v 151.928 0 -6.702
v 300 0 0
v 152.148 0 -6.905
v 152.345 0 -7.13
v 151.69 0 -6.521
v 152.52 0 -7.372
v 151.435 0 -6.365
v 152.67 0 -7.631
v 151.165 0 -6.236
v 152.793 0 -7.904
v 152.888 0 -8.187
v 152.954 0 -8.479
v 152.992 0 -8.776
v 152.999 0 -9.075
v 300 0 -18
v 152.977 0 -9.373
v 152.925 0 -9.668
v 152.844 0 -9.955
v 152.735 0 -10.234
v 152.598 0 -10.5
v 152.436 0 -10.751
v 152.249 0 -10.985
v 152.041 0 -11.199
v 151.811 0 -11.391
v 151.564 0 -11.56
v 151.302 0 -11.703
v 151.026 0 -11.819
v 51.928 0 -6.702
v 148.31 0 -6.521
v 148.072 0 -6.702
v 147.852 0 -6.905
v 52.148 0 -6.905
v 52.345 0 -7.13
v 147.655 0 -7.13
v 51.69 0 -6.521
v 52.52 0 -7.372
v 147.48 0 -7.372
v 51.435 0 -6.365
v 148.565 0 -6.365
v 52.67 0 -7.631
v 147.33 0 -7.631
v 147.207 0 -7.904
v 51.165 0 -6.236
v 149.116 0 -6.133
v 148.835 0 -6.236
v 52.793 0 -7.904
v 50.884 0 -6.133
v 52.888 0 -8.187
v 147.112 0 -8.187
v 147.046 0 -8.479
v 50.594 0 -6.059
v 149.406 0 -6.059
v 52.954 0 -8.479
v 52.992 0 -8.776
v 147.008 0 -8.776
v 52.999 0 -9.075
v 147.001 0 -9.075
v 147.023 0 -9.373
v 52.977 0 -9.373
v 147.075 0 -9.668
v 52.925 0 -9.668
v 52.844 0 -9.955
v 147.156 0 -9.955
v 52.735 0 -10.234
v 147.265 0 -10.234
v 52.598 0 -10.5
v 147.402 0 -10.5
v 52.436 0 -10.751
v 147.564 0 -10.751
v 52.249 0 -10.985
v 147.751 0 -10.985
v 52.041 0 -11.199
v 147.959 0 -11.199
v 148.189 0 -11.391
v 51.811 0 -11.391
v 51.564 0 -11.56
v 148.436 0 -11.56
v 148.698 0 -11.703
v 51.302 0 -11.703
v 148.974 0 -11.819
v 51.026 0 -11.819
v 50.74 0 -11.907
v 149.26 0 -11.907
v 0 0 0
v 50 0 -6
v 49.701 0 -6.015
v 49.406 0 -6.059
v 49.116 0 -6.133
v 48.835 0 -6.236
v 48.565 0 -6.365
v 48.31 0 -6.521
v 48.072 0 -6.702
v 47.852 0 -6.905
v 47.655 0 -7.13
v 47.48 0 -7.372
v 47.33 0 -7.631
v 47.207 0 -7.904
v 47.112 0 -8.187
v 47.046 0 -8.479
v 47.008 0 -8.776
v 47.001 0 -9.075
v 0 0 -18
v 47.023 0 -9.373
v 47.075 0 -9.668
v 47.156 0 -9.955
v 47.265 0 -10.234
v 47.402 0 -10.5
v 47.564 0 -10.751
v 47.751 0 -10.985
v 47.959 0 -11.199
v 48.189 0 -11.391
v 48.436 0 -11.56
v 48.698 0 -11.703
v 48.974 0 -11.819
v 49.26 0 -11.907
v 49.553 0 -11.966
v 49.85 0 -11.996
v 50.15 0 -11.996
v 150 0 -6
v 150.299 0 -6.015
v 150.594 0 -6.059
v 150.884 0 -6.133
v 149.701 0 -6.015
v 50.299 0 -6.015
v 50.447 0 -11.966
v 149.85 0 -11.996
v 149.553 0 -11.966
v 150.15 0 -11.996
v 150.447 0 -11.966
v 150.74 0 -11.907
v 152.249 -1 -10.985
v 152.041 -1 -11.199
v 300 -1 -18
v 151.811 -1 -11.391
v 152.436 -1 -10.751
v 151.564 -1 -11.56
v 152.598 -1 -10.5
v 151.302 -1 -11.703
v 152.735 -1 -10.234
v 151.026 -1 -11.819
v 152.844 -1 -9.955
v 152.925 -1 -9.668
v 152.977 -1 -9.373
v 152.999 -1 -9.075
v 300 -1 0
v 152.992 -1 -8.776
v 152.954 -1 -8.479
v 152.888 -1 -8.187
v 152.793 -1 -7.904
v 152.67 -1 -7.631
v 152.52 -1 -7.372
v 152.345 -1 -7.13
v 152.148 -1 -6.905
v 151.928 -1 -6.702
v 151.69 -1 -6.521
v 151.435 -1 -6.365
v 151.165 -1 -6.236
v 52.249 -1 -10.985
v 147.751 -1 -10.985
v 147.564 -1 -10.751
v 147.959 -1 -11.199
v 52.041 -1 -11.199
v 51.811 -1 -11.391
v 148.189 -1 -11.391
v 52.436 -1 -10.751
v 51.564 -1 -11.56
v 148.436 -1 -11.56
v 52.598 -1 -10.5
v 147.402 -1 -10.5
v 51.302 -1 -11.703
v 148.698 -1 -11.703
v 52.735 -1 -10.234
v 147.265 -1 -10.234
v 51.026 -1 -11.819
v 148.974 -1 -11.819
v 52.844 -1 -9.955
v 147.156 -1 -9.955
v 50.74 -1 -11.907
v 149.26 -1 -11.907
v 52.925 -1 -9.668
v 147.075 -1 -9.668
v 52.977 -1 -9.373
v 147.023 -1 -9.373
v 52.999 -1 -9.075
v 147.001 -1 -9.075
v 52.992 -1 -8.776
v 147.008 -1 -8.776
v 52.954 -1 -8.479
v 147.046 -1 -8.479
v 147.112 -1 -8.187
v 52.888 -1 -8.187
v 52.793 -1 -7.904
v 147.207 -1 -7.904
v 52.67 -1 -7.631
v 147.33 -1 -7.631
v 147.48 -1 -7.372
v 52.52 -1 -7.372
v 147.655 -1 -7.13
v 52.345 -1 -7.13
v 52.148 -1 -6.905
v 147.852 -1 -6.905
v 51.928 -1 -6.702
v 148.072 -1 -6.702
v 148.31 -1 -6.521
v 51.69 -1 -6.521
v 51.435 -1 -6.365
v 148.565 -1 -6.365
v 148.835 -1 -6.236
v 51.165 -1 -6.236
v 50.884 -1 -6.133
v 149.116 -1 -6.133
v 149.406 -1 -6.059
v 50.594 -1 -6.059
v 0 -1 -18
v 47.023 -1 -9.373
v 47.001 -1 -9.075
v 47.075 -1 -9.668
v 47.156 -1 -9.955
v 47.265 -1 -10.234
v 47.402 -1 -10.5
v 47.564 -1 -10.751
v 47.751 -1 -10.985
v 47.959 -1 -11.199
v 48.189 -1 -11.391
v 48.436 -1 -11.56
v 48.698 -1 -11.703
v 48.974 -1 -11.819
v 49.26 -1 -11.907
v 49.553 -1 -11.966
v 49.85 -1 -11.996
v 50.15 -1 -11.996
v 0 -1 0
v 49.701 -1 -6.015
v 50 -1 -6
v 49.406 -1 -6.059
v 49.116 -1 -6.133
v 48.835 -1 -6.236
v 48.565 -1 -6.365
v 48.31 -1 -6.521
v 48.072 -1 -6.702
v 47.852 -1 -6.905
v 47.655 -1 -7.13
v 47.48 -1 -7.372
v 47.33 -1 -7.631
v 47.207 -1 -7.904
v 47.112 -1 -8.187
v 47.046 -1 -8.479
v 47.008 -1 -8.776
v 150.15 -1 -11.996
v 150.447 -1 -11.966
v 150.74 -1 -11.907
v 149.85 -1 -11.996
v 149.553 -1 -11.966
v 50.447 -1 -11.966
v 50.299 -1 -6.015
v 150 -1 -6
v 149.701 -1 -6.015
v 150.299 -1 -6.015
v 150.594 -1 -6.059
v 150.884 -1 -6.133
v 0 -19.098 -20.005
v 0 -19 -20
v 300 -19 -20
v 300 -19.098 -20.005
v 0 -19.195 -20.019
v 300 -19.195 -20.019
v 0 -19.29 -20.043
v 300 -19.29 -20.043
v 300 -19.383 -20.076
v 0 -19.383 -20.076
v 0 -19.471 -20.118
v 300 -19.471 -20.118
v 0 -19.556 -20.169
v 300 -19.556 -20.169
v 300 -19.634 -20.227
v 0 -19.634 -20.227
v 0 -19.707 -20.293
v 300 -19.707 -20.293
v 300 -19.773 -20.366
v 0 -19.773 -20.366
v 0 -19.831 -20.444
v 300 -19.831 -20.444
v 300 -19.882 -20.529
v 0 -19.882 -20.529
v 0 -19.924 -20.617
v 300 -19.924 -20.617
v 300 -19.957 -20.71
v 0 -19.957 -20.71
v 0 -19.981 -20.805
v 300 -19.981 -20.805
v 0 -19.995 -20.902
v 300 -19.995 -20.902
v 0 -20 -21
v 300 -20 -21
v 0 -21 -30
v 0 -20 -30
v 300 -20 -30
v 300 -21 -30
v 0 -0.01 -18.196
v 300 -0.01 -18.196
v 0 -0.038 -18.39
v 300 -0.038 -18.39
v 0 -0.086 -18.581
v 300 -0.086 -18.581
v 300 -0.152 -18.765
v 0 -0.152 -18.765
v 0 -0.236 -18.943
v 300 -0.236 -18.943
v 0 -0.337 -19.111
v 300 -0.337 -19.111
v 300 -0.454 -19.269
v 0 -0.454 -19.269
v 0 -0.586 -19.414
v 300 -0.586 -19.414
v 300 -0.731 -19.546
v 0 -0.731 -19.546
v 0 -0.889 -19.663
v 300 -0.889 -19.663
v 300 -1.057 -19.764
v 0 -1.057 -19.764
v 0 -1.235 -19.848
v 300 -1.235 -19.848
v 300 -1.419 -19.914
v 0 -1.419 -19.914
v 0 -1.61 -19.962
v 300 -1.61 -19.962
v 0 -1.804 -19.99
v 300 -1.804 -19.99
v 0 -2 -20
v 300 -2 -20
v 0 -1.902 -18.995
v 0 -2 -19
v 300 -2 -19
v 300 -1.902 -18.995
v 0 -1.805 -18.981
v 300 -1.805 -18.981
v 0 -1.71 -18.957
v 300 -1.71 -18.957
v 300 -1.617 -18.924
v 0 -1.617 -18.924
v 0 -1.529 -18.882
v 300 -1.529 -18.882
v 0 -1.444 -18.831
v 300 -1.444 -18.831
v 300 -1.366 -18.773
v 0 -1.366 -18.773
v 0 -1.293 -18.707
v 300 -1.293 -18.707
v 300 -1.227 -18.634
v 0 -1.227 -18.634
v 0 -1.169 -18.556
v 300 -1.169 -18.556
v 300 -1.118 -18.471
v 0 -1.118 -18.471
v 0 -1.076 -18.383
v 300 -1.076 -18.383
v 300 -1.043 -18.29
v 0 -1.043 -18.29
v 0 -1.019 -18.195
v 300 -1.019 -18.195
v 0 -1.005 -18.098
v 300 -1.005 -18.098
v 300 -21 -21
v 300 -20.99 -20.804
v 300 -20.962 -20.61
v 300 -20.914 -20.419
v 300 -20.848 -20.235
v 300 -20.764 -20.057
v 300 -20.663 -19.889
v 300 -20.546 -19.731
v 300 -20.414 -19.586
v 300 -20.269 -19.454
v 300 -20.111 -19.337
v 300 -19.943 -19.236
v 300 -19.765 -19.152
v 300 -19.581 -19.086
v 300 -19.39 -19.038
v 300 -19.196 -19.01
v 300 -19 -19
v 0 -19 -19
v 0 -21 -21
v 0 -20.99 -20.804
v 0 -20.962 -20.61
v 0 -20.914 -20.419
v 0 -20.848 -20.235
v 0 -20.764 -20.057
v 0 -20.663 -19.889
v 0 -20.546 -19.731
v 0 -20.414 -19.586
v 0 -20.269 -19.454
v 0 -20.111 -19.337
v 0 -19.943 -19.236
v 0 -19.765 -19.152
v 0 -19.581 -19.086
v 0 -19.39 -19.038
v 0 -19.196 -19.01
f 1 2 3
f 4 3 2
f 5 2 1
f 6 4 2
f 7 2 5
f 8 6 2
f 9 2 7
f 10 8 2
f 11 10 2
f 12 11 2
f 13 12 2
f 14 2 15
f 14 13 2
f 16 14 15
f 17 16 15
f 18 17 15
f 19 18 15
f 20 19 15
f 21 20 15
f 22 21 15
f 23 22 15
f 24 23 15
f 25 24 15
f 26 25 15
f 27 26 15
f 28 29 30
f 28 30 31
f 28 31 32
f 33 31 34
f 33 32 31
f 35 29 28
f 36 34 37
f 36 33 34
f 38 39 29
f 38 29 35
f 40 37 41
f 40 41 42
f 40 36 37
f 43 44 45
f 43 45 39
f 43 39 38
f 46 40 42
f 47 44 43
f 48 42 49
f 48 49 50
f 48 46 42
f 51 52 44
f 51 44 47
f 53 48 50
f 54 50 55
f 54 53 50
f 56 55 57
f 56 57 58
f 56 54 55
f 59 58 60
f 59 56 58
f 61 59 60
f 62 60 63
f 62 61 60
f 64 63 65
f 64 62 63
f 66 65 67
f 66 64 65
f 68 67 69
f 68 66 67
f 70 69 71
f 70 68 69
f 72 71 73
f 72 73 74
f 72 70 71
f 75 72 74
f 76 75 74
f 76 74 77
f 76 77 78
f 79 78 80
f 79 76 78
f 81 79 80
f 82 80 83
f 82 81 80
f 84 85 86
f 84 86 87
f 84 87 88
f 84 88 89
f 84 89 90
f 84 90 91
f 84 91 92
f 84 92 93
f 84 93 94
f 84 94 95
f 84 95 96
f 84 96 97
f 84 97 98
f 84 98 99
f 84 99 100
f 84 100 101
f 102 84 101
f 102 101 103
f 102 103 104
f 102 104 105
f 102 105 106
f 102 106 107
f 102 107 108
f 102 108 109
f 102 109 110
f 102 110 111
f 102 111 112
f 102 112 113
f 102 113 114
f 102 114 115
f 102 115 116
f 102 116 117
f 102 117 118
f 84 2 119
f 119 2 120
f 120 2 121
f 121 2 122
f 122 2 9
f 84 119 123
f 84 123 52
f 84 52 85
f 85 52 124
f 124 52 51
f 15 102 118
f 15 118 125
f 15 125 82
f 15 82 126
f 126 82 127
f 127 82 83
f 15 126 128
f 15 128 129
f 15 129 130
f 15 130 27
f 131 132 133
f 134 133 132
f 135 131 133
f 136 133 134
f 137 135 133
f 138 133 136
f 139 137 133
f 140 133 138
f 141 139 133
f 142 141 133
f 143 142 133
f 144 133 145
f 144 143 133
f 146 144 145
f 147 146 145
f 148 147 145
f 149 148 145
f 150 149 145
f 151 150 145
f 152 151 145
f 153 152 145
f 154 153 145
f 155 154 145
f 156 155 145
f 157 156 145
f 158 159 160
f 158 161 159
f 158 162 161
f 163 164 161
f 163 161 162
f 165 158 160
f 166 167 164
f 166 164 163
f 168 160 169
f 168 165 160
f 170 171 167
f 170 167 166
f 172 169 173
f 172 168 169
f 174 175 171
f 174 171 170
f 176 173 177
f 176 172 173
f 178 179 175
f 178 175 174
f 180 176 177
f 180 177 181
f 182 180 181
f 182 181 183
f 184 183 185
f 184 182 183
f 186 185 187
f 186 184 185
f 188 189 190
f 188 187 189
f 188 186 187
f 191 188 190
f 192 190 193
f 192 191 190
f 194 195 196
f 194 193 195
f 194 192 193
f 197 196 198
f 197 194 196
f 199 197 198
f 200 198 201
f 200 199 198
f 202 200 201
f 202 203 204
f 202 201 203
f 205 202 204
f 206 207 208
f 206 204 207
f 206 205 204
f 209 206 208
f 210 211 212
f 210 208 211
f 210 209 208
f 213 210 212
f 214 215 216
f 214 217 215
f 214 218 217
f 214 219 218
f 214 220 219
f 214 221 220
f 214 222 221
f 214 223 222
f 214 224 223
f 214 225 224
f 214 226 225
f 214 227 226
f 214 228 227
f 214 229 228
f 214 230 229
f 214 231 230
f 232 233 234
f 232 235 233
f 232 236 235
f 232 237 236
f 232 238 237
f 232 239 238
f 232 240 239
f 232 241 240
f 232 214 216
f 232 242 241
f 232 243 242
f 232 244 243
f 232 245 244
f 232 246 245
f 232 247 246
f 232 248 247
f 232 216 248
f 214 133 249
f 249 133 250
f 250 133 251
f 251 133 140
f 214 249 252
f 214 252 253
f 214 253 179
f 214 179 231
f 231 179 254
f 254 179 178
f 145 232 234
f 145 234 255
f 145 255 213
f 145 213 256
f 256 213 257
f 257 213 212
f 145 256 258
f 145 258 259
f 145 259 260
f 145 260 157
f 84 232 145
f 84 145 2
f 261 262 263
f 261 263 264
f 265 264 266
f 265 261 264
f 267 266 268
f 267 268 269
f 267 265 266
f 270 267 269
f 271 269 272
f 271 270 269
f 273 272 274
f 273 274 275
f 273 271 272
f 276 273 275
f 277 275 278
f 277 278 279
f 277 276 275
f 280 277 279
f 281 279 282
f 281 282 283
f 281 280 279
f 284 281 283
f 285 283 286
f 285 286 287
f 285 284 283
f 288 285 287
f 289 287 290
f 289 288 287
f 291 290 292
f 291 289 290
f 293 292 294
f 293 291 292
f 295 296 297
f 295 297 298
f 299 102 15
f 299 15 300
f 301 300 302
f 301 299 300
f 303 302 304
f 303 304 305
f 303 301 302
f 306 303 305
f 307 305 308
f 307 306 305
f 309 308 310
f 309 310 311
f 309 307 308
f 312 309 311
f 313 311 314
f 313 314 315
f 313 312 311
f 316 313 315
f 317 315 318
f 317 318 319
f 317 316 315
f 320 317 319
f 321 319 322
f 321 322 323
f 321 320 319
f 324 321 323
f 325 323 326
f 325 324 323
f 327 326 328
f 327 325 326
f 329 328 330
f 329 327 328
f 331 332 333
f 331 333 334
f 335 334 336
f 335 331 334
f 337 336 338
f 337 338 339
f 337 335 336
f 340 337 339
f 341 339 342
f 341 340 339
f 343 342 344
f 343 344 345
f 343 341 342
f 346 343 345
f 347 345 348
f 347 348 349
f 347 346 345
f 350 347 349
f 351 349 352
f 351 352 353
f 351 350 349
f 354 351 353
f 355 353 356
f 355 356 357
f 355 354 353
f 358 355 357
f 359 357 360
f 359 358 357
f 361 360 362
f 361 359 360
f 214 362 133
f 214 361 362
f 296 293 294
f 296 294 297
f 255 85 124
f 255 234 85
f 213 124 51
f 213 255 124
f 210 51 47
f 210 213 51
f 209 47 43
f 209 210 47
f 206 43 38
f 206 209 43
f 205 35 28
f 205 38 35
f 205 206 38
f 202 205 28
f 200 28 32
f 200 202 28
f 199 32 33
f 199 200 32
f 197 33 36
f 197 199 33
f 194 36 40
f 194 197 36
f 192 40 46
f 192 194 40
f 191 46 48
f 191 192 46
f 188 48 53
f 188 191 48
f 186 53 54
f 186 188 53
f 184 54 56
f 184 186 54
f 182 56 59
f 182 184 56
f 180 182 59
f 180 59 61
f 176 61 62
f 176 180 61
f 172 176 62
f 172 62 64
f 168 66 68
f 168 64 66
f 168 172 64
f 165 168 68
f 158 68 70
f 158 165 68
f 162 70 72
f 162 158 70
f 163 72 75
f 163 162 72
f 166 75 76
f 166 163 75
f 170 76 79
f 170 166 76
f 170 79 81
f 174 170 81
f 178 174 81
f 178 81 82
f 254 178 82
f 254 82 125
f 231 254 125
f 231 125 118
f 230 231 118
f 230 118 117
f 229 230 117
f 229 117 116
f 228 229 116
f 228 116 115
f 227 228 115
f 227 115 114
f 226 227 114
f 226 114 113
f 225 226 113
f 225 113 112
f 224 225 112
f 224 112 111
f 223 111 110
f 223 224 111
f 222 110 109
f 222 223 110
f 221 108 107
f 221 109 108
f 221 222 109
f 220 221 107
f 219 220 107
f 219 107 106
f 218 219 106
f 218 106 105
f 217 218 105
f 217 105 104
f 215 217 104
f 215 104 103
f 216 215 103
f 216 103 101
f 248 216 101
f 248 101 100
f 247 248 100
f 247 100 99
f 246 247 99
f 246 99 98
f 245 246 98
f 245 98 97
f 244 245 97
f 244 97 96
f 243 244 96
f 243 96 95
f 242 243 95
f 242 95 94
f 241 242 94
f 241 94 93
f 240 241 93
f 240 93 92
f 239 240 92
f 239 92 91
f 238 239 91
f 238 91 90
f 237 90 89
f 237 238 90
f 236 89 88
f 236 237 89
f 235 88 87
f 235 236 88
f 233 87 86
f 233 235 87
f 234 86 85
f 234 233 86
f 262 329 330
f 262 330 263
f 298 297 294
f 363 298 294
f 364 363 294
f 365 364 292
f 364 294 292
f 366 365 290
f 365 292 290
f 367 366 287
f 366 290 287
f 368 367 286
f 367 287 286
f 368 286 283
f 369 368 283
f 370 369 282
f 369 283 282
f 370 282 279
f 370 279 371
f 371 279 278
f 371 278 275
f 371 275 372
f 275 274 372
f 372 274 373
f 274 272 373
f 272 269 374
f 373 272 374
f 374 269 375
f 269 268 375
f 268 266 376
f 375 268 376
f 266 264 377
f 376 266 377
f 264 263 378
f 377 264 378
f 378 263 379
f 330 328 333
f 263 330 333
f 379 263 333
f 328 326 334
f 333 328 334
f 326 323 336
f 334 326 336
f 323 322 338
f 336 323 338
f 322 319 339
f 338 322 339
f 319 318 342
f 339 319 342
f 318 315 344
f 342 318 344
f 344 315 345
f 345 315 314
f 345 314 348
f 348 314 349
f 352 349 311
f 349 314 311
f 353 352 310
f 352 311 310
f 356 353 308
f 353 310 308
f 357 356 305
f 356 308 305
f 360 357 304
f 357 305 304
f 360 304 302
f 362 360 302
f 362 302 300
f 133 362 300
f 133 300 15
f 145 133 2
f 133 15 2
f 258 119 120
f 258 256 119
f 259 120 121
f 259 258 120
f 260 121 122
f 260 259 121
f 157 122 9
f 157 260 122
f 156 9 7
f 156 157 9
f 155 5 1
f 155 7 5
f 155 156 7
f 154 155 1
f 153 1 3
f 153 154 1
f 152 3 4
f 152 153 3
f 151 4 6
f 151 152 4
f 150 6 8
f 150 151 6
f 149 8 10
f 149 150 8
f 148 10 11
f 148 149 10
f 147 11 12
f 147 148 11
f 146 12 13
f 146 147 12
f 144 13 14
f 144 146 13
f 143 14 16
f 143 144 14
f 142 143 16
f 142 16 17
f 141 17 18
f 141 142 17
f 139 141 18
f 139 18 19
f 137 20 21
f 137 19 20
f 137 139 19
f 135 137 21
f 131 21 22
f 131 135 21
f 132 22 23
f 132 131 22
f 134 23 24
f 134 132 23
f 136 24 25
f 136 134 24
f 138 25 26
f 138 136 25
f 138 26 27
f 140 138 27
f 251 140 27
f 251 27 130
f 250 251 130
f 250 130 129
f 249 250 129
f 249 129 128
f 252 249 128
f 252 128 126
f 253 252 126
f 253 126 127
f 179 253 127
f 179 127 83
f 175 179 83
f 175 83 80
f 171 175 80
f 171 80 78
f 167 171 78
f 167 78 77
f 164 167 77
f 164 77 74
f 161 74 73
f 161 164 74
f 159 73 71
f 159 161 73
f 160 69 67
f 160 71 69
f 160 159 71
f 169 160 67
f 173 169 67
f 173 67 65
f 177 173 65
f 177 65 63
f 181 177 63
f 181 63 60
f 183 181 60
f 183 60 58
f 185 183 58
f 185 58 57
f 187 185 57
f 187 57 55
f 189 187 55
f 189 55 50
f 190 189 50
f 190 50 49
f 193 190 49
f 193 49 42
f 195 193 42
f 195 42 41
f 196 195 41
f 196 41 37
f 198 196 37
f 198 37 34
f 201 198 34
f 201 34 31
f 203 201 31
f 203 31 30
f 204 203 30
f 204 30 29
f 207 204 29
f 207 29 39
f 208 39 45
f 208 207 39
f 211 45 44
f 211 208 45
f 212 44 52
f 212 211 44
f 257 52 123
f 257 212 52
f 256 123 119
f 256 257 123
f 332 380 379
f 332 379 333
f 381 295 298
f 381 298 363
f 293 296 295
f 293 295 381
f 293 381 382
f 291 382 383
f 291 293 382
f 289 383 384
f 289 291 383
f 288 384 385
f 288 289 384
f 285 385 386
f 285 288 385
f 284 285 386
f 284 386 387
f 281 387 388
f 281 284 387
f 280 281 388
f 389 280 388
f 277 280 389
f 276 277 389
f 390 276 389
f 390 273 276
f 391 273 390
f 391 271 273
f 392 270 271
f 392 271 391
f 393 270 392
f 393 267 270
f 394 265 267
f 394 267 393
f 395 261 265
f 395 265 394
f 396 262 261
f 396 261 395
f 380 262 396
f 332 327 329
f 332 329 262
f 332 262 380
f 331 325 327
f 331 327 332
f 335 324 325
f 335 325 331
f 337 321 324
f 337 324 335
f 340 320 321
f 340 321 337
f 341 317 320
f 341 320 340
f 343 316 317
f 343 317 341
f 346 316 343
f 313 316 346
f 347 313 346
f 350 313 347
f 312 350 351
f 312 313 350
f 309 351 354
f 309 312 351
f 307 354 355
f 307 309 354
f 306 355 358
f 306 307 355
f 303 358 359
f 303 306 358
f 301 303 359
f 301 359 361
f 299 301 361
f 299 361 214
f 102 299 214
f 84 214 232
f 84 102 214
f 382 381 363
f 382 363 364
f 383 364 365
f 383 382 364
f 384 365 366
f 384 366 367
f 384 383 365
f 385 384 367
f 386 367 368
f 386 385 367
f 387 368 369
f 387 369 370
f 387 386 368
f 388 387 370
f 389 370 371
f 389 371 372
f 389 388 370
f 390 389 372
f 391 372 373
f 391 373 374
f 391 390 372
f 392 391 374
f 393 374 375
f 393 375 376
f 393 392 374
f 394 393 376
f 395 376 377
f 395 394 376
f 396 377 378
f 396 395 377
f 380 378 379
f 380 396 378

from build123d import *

# Parameters (mm, degrees)
BASE_FLANGE1_DEPTH      = 300
CUT_EXTRUDE1_DEPTH      = 303.226736077
CUT_EXTRUDE1_DEPTH_BACK = 303.226736077
SKETCH7_R               = 3


# Sheet-metal steps are written as plain solids
with BuildPart() as part:
    # Sketch2 → Base-Flange1 (new body)
    with BuildSketch(Plane(origin=(0, 0, 0), x_dir=(0, 0, -1), z_dir=(1, 0, 0))):
        with BuildLine():
            Line((0, 0), (18, 0))
            ThreePointArc((18, 0), (19.414213562, -0.585786438), (20, -2))
            Line((20, -2), (20, -19))
            ThreePointArc((20, -19), (20.292893219, -19.707106781), (21, -20))
            Line((21, -20), (30, -20))
            Line((30, -20), (30, -21))
            Line((30, -21), (21, -21))
            ThreePointArc((21, -21), (19.585786438, -20.414213562), (19, -19))
            Line((19, -19), (19, -2))
            ThreePointArc((19, -2), (18.707106781, -1.292893219), (18, -1))
            Line((18, -1), (0, -1))
            Line((0, -1), (0, 0))
        make_face()
    extrude(amount=BASE_FLANGE1_DEPTH)

    # Sketch7 → Cut-Extrude1 (cut, two sides: drawn at the far end of the back side and taken through both)
    with BuildSketch(Plane(origin=(0, 0, 0), x_dir=(1, 0, 0), z_dir=(0, 1, 0)).offset(-CUT_EXTRUDE1_DEPTH_BACK)):
        with Locations(Location((50, 9, 0), (0, 0, 270))):
            Circle(SKETCH7_R)
        with Locations(Location((150, 9, 0), (0, 0, 270))):
            Circle(SKETCH7_R)
    extrude(amount=CUT_EXTRUDE1_DEPTH + CUT_EXTRUDE1_DEPTH_BACK, mode=Mode.SUBTRACT)


solid = part.part
